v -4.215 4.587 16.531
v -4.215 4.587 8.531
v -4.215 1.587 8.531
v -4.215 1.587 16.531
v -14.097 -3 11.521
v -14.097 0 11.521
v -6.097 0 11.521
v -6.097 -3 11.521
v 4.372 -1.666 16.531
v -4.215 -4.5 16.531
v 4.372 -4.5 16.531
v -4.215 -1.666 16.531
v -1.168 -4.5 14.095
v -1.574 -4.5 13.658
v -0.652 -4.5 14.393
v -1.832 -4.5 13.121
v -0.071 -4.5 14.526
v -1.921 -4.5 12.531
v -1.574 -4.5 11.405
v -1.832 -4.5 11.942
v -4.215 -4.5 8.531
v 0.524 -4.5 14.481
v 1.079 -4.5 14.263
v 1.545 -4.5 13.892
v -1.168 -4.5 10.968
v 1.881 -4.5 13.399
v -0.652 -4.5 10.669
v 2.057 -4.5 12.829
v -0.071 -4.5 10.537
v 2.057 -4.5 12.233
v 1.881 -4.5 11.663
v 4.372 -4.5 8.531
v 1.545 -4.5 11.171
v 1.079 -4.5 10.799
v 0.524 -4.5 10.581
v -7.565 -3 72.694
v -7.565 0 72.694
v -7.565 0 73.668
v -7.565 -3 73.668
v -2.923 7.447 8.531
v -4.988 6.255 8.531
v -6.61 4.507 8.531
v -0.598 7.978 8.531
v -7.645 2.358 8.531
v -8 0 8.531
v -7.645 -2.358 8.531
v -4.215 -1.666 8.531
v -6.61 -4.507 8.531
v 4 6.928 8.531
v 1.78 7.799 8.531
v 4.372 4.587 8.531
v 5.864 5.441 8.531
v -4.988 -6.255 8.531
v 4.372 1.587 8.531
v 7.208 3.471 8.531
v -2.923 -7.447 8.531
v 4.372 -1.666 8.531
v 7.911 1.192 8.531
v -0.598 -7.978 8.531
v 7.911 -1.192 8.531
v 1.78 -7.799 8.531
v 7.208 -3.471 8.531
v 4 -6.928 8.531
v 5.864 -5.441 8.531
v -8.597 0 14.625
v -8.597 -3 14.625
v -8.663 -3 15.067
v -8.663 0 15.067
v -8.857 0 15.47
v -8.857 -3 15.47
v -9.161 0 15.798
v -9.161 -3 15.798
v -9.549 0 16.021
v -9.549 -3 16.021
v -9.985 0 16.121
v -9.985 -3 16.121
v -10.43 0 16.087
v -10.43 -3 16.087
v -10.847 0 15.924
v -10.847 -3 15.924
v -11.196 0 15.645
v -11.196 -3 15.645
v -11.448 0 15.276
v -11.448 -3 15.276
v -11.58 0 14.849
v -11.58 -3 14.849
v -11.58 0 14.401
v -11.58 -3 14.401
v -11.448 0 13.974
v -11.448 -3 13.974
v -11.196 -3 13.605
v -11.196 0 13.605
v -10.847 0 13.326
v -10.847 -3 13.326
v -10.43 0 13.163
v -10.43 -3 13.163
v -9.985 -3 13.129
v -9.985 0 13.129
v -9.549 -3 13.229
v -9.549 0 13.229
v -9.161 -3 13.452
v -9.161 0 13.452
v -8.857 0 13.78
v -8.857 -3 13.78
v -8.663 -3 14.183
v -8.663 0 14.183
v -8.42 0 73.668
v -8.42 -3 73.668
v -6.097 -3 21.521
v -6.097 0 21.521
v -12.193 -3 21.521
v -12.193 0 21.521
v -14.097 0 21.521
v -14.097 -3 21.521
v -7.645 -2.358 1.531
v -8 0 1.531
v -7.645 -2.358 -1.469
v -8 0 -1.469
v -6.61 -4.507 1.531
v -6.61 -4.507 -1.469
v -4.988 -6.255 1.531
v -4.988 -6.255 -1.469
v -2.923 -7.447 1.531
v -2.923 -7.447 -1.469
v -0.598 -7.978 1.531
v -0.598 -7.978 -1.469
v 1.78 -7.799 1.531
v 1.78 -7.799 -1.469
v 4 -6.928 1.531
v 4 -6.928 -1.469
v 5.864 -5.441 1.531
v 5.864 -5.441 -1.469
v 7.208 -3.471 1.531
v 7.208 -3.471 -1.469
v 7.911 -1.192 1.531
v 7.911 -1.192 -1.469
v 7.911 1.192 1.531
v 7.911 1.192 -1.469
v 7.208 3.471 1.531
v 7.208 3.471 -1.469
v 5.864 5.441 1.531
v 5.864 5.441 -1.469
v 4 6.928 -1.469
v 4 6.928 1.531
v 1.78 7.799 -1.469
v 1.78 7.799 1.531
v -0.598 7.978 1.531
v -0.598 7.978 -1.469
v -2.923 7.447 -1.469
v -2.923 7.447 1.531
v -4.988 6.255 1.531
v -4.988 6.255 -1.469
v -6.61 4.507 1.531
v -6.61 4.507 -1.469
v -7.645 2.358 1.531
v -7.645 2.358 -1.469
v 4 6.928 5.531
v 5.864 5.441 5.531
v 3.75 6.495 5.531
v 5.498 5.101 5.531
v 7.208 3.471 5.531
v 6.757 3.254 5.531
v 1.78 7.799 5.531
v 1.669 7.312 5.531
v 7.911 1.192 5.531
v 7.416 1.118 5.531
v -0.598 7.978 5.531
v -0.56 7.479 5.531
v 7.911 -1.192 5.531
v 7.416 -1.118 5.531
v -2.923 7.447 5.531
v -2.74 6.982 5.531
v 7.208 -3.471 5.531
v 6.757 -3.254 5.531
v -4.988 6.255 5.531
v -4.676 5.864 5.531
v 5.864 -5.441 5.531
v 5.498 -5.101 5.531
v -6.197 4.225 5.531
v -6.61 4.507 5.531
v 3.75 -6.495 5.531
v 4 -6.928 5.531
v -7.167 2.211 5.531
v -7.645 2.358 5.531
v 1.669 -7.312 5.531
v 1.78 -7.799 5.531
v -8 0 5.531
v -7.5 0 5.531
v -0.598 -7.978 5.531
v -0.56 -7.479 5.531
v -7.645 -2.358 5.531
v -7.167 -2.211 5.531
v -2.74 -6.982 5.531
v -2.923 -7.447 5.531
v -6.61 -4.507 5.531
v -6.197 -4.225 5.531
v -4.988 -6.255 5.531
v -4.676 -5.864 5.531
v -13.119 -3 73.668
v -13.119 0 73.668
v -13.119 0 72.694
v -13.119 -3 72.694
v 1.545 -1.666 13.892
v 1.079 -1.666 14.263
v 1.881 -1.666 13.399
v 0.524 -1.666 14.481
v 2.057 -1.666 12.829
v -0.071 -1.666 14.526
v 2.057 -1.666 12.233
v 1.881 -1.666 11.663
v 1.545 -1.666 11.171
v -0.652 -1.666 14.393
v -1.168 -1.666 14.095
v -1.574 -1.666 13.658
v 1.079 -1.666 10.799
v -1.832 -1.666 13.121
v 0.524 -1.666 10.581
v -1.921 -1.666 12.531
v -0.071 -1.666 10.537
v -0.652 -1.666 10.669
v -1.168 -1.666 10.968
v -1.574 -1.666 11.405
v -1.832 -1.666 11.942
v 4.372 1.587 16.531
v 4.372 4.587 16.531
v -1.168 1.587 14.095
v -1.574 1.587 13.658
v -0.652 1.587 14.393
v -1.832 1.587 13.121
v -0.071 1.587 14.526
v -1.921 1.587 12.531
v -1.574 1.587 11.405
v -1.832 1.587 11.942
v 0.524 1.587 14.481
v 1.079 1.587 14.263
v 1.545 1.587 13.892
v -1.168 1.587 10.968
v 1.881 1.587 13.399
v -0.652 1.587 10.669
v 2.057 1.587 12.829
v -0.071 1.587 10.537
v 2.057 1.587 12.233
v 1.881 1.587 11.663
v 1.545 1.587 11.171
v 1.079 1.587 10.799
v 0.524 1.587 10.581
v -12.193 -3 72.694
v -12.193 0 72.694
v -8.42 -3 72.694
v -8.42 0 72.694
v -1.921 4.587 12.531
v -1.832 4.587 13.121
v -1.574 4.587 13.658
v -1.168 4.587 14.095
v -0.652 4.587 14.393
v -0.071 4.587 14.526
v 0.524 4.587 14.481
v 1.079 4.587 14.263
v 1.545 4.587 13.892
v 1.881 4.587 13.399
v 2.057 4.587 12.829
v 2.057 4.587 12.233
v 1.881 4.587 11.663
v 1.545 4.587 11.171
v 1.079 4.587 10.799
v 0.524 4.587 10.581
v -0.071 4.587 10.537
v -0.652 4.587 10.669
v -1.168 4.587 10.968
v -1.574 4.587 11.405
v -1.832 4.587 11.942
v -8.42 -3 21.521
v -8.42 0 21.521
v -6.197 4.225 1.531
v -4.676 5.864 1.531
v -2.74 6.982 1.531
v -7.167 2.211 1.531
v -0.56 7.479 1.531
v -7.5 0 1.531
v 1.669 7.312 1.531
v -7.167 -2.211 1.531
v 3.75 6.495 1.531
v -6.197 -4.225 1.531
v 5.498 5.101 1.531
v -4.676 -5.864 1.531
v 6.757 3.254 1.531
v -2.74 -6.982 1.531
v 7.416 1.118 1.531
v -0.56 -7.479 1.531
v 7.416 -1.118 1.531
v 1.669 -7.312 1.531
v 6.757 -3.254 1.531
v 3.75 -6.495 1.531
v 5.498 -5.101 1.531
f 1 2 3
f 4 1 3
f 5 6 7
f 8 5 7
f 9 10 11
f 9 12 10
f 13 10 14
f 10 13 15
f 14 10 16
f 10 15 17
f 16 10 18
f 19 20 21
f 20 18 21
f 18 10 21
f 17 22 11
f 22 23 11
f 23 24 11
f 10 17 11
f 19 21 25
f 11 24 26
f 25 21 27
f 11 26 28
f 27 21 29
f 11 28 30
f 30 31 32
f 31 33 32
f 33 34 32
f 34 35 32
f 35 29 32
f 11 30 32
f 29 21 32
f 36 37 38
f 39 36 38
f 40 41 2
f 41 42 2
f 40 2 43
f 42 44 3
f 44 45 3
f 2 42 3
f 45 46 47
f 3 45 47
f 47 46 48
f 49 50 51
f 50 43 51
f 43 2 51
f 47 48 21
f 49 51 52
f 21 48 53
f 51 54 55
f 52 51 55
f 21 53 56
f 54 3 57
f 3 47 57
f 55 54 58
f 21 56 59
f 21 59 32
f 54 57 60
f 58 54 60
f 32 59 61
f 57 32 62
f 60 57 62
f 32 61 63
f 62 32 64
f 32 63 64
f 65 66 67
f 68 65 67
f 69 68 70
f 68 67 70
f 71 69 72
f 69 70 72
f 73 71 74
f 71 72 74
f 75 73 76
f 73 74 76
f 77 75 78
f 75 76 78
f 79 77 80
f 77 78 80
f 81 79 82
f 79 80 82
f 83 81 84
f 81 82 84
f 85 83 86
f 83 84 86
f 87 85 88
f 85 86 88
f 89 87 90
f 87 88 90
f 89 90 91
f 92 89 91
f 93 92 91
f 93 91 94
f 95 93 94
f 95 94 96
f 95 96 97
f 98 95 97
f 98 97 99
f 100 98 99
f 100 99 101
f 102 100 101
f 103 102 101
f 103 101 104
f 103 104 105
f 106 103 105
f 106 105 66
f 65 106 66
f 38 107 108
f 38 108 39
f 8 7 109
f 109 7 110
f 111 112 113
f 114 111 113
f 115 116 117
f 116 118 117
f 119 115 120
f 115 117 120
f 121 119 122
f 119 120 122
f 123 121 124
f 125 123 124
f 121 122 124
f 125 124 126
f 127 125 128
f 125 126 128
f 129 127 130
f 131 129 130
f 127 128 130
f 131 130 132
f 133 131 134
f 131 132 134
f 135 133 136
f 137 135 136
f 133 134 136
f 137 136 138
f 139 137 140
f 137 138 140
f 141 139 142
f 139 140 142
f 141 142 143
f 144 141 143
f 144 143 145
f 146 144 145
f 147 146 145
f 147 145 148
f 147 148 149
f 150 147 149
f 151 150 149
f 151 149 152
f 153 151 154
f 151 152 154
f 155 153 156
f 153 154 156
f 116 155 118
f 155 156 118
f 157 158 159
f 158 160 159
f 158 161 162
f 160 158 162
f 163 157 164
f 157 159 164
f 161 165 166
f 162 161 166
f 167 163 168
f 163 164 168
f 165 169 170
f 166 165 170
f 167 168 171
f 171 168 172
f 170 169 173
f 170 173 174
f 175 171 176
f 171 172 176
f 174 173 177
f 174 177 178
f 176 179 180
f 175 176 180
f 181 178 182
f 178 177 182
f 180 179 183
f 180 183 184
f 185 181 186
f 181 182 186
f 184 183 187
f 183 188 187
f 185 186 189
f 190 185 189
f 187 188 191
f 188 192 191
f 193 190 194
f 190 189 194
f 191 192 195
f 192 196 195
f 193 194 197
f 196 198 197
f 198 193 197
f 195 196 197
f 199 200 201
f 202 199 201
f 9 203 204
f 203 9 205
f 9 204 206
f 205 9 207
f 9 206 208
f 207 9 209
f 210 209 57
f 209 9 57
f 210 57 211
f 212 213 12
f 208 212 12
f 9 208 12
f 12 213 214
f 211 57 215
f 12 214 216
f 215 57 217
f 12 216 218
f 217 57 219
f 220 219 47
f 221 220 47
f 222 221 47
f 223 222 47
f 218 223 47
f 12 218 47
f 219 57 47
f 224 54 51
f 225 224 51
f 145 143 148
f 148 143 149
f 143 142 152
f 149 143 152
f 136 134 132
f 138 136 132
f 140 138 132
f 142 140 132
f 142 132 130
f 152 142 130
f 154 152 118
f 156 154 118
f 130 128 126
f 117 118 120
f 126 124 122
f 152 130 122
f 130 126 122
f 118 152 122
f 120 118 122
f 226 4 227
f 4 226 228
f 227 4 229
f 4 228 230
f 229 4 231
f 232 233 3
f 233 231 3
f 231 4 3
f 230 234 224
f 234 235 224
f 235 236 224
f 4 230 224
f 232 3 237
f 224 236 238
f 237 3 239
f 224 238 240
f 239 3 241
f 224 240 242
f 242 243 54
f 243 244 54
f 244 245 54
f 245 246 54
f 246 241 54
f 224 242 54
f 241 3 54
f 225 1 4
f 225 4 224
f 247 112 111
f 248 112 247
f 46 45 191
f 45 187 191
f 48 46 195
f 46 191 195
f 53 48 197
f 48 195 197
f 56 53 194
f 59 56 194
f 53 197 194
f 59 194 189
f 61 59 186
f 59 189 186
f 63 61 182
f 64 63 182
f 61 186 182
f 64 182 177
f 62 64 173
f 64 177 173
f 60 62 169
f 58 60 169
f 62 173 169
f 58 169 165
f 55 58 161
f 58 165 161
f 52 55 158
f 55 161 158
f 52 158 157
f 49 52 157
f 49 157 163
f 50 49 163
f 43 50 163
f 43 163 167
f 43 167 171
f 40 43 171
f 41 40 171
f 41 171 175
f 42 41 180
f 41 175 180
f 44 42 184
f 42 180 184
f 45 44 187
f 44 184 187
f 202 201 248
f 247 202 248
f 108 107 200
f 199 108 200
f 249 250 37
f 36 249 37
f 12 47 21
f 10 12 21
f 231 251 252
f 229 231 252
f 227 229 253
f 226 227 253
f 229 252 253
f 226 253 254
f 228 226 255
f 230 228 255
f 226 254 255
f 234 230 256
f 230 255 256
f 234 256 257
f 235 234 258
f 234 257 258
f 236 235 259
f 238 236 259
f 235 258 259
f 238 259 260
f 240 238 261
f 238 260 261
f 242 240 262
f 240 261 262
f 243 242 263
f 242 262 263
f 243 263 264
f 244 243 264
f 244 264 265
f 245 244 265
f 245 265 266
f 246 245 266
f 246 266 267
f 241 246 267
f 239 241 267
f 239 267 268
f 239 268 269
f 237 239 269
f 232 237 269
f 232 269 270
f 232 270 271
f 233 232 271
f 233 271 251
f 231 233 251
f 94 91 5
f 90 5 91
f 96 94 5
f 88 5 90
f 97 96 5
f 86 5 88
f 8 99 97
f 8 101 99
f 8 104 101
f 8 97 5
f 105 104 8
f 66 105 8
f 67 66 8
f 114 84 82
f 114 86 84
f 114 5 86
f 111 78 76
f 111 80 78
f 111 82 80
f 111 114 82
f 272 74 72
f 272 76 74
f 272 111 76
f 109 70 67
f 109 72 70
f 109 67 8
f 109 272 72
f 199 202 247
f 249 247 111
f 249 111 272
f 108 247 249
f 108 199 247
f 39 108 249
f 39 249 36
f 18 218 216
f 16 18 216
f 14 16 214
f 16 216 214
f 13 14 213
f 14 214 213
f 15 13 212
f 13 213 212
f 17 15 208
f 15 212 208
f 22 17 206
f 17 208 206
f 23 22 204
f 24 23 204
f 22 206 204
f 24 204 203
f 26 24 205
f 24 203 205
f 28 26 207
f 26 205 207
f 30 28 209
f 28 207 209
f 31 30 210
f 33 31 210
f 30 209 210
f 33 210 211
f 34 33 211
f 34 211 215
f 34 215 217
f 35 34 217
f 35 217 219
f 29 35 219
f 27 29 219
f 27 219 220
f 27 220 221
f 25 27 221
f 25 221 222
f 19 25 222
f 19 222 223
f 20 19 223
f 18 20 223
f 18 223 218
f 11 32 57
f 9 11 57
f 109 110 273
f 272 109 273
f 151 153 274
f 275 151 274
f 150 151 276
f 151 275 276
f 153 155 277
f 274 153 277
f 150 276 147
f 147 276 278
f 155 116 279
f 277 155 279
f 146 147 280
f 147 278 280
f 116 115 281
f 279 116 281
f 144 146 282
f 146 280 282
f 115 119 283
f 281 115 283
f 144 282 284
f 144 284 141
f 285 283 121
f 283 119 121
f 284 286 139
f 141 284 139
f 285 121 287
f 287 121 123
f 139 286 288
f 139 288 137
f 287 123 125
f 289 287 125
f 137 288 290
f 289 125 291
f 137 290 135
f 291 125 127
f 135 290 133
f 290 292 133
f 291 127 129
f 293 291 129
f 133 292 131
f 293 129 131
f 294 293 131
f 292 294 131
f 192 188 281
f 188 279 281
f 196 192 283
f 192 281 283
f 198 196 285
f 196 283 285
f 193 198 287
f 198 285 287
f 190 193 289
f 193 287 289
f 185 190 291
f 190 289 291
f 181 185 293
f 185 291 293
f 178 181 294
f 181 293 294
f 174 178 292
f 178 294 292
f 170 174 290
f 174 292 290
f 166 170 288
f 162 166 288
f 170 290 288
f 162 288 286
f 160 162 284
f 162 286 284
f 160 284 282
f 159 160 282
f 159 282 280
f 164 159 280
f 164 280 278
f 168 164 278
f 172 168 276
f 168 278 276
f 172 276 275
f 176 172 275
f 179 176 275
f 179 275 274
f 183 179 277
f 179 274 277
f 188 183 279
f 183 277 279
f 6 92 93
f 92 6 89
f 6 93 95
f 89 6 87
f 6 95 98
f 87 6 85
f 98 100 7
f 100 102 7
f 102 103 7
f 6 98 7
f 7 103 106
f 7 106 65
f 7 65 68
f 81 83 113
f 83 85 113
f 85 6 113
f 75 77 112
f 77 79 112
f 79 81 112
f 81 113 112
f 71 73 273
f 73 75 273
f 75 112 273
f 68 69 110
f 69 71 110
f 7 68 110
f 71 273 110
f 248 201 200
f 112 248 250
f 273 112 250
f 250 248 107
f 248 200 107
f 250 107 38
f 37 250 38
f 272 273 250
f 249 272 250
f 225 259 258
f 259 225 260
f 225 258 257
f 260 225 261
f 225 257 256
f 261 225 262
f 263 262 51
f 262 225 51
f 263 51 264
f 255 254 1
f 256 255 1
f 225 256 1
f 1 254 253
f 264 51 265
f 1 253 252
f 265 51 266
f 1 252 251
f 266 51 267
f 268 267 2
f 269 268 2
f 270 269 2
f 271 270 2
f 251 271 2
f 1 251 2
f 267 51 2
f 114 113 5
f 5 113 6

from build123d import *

# Parameters (mm, degrees)
F3_DEPTH = 8
F5_D     = 4
F6_W     = 3.773432
F6_H     = 51.173568
F6_W_2   = 0.854586
F6_H_2   = 0.973835
F7_DEPTH = 3
F9_D     = 3


with BuildPart() as f1:
    # F0 (on Front) → F1 (revolve)
    with BuildSketch(Plane.XZ):
        Polygon((0, -1.468786), (0, 8.531214), (-8, 8.531214), (-8, 5.531214), (-7.5, 5.531214), (-7.5, 1.531214), (-8, 1.531214), (-8, -1.468786), align=None)
    revolve(axis=Axis((0, 0, 3.531214), (0, 0, 1)))

    # F2 (on face) → F3 (join)
    with BuildSketch(Plane.XY.offset(8.531214)):
        Polygon((-4.214561, -4.5), (-3, -4.5), (4.37242, -4.5), (4.37242, -1.666163), (-3, -1.666163), (-4.214561, -1.666163), align=None)
        Polygon((4.37242, 4.586634), (-2.714561, 4.586634), (-4.214561, 4.586634), (-4.214561, 1.586634), (-2.714561, 1.586634), (4.37242, 1.586634), align=None)
    extrude(amount=F3_DEPTH)

    # F5 (through all)
    with Locations(Plane.XZ.offset(4.5)):
        with Locations((0.078929, 12.531214)):
            Hole(F5_D / 2)


with BuildPart() as f7:
    # F6 (on Front) → F7 (new body)
    with BuildSketch(Plane.XZ):
        Polygon((-14.096678, 11.520622), (-6.096678, 11.520622), (-6.096678, 21.520622), (-8.419598, 21.520622), (-12.19303, 21.520622), (-14.096678, 21.520622), align=None)
        with Locations((-10.306314, 47.107406)):
            Rectangle(F6_W, F6_H)
        Polygon((-12.19303, 72.69419), (-8.419598, 72.69419), (-8.419598, 73.668025), (-13.119084, 73.668025), (-13.119084, 72.69419), align=None)
        with Locations((-7.992305, 73.181107)):
            Rectangle(F6_W_2, F6_H_2)
    extrude(amount=F7_DEPTH)

    # F9 (through all)
    with Locations(Plane(origin=(0, 0, 0), x_dir=(-1, 0, 0), z_dir=(0, 1, 0))):
        with Locations((10.096678, 14.625018)):
            Hole(F9_D / 2)


solid = Compound([f1.part, f7.part])
